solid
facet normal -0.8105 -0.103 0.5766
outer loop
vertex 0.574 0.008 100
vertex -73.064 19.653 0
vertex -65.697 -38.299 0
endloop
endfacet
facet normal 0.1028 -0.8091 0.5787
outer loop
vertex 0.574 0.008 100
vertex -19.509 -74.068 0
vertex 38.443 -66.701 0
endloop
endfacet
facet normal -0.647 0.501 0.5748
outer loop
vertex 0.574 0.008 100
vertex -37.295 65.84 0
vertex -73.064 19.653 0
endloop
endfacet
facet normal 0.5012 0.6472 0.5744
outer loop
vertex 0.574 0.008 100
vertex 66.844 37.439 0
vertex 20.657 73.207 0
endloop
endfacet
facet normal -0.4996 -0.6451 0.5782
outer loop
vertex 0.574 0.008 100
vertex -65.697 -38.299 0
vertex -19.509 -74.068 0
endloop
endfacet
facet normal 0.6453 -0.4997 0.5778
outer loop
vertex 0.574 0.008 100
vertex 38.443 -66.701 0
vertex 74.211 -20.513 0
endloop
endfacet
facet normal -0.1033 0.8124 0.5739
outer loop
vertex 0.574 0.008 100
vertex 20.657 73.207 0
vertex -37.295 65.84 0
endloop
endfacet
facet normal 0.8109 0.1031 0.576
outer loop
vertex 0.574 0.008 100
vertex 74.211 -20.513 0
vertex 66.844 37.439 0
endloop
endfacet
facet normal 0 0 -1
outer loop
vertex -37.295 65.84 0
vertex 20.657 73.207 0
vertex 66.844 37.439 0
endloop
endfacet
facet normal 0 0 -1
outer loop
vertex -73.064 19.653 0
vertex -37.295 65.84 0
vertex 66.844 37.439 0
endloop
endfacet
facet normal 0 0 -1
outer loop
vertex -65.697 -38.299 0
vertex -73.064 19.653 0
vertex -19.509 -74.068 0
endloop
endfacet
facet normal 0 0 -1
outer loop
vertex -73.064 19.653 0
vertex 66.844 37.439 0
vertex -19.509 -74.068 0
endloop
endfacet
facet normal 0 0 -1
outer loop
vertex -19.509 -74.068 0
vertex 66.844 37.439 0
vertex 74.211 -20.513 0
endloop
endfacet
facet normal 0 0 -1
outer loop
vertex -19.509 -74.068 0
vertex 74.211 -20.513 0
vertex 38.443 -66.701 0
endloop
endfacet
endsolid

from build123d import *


with BuildPart() as f3:
    # F0 (on Top) → F3 section 0
    with BuildSketch(Plane.XY, mode=Mode.PRIVATE) as f3_s0:
        Polygon((20.656764, 73.207314), (-37.295084, 65.84017), (-73.063872, 19.652667), (-65.696728, -38.299182), (-19.509226, -74.067969), (38.442623, -66.700826), (74.211411, -20.513323), (66.844267, 37.438526), align=None)
    loft([Vertex(0.573766, 0.007616, 100), f3_s0.sketch])


solid = f3.part
